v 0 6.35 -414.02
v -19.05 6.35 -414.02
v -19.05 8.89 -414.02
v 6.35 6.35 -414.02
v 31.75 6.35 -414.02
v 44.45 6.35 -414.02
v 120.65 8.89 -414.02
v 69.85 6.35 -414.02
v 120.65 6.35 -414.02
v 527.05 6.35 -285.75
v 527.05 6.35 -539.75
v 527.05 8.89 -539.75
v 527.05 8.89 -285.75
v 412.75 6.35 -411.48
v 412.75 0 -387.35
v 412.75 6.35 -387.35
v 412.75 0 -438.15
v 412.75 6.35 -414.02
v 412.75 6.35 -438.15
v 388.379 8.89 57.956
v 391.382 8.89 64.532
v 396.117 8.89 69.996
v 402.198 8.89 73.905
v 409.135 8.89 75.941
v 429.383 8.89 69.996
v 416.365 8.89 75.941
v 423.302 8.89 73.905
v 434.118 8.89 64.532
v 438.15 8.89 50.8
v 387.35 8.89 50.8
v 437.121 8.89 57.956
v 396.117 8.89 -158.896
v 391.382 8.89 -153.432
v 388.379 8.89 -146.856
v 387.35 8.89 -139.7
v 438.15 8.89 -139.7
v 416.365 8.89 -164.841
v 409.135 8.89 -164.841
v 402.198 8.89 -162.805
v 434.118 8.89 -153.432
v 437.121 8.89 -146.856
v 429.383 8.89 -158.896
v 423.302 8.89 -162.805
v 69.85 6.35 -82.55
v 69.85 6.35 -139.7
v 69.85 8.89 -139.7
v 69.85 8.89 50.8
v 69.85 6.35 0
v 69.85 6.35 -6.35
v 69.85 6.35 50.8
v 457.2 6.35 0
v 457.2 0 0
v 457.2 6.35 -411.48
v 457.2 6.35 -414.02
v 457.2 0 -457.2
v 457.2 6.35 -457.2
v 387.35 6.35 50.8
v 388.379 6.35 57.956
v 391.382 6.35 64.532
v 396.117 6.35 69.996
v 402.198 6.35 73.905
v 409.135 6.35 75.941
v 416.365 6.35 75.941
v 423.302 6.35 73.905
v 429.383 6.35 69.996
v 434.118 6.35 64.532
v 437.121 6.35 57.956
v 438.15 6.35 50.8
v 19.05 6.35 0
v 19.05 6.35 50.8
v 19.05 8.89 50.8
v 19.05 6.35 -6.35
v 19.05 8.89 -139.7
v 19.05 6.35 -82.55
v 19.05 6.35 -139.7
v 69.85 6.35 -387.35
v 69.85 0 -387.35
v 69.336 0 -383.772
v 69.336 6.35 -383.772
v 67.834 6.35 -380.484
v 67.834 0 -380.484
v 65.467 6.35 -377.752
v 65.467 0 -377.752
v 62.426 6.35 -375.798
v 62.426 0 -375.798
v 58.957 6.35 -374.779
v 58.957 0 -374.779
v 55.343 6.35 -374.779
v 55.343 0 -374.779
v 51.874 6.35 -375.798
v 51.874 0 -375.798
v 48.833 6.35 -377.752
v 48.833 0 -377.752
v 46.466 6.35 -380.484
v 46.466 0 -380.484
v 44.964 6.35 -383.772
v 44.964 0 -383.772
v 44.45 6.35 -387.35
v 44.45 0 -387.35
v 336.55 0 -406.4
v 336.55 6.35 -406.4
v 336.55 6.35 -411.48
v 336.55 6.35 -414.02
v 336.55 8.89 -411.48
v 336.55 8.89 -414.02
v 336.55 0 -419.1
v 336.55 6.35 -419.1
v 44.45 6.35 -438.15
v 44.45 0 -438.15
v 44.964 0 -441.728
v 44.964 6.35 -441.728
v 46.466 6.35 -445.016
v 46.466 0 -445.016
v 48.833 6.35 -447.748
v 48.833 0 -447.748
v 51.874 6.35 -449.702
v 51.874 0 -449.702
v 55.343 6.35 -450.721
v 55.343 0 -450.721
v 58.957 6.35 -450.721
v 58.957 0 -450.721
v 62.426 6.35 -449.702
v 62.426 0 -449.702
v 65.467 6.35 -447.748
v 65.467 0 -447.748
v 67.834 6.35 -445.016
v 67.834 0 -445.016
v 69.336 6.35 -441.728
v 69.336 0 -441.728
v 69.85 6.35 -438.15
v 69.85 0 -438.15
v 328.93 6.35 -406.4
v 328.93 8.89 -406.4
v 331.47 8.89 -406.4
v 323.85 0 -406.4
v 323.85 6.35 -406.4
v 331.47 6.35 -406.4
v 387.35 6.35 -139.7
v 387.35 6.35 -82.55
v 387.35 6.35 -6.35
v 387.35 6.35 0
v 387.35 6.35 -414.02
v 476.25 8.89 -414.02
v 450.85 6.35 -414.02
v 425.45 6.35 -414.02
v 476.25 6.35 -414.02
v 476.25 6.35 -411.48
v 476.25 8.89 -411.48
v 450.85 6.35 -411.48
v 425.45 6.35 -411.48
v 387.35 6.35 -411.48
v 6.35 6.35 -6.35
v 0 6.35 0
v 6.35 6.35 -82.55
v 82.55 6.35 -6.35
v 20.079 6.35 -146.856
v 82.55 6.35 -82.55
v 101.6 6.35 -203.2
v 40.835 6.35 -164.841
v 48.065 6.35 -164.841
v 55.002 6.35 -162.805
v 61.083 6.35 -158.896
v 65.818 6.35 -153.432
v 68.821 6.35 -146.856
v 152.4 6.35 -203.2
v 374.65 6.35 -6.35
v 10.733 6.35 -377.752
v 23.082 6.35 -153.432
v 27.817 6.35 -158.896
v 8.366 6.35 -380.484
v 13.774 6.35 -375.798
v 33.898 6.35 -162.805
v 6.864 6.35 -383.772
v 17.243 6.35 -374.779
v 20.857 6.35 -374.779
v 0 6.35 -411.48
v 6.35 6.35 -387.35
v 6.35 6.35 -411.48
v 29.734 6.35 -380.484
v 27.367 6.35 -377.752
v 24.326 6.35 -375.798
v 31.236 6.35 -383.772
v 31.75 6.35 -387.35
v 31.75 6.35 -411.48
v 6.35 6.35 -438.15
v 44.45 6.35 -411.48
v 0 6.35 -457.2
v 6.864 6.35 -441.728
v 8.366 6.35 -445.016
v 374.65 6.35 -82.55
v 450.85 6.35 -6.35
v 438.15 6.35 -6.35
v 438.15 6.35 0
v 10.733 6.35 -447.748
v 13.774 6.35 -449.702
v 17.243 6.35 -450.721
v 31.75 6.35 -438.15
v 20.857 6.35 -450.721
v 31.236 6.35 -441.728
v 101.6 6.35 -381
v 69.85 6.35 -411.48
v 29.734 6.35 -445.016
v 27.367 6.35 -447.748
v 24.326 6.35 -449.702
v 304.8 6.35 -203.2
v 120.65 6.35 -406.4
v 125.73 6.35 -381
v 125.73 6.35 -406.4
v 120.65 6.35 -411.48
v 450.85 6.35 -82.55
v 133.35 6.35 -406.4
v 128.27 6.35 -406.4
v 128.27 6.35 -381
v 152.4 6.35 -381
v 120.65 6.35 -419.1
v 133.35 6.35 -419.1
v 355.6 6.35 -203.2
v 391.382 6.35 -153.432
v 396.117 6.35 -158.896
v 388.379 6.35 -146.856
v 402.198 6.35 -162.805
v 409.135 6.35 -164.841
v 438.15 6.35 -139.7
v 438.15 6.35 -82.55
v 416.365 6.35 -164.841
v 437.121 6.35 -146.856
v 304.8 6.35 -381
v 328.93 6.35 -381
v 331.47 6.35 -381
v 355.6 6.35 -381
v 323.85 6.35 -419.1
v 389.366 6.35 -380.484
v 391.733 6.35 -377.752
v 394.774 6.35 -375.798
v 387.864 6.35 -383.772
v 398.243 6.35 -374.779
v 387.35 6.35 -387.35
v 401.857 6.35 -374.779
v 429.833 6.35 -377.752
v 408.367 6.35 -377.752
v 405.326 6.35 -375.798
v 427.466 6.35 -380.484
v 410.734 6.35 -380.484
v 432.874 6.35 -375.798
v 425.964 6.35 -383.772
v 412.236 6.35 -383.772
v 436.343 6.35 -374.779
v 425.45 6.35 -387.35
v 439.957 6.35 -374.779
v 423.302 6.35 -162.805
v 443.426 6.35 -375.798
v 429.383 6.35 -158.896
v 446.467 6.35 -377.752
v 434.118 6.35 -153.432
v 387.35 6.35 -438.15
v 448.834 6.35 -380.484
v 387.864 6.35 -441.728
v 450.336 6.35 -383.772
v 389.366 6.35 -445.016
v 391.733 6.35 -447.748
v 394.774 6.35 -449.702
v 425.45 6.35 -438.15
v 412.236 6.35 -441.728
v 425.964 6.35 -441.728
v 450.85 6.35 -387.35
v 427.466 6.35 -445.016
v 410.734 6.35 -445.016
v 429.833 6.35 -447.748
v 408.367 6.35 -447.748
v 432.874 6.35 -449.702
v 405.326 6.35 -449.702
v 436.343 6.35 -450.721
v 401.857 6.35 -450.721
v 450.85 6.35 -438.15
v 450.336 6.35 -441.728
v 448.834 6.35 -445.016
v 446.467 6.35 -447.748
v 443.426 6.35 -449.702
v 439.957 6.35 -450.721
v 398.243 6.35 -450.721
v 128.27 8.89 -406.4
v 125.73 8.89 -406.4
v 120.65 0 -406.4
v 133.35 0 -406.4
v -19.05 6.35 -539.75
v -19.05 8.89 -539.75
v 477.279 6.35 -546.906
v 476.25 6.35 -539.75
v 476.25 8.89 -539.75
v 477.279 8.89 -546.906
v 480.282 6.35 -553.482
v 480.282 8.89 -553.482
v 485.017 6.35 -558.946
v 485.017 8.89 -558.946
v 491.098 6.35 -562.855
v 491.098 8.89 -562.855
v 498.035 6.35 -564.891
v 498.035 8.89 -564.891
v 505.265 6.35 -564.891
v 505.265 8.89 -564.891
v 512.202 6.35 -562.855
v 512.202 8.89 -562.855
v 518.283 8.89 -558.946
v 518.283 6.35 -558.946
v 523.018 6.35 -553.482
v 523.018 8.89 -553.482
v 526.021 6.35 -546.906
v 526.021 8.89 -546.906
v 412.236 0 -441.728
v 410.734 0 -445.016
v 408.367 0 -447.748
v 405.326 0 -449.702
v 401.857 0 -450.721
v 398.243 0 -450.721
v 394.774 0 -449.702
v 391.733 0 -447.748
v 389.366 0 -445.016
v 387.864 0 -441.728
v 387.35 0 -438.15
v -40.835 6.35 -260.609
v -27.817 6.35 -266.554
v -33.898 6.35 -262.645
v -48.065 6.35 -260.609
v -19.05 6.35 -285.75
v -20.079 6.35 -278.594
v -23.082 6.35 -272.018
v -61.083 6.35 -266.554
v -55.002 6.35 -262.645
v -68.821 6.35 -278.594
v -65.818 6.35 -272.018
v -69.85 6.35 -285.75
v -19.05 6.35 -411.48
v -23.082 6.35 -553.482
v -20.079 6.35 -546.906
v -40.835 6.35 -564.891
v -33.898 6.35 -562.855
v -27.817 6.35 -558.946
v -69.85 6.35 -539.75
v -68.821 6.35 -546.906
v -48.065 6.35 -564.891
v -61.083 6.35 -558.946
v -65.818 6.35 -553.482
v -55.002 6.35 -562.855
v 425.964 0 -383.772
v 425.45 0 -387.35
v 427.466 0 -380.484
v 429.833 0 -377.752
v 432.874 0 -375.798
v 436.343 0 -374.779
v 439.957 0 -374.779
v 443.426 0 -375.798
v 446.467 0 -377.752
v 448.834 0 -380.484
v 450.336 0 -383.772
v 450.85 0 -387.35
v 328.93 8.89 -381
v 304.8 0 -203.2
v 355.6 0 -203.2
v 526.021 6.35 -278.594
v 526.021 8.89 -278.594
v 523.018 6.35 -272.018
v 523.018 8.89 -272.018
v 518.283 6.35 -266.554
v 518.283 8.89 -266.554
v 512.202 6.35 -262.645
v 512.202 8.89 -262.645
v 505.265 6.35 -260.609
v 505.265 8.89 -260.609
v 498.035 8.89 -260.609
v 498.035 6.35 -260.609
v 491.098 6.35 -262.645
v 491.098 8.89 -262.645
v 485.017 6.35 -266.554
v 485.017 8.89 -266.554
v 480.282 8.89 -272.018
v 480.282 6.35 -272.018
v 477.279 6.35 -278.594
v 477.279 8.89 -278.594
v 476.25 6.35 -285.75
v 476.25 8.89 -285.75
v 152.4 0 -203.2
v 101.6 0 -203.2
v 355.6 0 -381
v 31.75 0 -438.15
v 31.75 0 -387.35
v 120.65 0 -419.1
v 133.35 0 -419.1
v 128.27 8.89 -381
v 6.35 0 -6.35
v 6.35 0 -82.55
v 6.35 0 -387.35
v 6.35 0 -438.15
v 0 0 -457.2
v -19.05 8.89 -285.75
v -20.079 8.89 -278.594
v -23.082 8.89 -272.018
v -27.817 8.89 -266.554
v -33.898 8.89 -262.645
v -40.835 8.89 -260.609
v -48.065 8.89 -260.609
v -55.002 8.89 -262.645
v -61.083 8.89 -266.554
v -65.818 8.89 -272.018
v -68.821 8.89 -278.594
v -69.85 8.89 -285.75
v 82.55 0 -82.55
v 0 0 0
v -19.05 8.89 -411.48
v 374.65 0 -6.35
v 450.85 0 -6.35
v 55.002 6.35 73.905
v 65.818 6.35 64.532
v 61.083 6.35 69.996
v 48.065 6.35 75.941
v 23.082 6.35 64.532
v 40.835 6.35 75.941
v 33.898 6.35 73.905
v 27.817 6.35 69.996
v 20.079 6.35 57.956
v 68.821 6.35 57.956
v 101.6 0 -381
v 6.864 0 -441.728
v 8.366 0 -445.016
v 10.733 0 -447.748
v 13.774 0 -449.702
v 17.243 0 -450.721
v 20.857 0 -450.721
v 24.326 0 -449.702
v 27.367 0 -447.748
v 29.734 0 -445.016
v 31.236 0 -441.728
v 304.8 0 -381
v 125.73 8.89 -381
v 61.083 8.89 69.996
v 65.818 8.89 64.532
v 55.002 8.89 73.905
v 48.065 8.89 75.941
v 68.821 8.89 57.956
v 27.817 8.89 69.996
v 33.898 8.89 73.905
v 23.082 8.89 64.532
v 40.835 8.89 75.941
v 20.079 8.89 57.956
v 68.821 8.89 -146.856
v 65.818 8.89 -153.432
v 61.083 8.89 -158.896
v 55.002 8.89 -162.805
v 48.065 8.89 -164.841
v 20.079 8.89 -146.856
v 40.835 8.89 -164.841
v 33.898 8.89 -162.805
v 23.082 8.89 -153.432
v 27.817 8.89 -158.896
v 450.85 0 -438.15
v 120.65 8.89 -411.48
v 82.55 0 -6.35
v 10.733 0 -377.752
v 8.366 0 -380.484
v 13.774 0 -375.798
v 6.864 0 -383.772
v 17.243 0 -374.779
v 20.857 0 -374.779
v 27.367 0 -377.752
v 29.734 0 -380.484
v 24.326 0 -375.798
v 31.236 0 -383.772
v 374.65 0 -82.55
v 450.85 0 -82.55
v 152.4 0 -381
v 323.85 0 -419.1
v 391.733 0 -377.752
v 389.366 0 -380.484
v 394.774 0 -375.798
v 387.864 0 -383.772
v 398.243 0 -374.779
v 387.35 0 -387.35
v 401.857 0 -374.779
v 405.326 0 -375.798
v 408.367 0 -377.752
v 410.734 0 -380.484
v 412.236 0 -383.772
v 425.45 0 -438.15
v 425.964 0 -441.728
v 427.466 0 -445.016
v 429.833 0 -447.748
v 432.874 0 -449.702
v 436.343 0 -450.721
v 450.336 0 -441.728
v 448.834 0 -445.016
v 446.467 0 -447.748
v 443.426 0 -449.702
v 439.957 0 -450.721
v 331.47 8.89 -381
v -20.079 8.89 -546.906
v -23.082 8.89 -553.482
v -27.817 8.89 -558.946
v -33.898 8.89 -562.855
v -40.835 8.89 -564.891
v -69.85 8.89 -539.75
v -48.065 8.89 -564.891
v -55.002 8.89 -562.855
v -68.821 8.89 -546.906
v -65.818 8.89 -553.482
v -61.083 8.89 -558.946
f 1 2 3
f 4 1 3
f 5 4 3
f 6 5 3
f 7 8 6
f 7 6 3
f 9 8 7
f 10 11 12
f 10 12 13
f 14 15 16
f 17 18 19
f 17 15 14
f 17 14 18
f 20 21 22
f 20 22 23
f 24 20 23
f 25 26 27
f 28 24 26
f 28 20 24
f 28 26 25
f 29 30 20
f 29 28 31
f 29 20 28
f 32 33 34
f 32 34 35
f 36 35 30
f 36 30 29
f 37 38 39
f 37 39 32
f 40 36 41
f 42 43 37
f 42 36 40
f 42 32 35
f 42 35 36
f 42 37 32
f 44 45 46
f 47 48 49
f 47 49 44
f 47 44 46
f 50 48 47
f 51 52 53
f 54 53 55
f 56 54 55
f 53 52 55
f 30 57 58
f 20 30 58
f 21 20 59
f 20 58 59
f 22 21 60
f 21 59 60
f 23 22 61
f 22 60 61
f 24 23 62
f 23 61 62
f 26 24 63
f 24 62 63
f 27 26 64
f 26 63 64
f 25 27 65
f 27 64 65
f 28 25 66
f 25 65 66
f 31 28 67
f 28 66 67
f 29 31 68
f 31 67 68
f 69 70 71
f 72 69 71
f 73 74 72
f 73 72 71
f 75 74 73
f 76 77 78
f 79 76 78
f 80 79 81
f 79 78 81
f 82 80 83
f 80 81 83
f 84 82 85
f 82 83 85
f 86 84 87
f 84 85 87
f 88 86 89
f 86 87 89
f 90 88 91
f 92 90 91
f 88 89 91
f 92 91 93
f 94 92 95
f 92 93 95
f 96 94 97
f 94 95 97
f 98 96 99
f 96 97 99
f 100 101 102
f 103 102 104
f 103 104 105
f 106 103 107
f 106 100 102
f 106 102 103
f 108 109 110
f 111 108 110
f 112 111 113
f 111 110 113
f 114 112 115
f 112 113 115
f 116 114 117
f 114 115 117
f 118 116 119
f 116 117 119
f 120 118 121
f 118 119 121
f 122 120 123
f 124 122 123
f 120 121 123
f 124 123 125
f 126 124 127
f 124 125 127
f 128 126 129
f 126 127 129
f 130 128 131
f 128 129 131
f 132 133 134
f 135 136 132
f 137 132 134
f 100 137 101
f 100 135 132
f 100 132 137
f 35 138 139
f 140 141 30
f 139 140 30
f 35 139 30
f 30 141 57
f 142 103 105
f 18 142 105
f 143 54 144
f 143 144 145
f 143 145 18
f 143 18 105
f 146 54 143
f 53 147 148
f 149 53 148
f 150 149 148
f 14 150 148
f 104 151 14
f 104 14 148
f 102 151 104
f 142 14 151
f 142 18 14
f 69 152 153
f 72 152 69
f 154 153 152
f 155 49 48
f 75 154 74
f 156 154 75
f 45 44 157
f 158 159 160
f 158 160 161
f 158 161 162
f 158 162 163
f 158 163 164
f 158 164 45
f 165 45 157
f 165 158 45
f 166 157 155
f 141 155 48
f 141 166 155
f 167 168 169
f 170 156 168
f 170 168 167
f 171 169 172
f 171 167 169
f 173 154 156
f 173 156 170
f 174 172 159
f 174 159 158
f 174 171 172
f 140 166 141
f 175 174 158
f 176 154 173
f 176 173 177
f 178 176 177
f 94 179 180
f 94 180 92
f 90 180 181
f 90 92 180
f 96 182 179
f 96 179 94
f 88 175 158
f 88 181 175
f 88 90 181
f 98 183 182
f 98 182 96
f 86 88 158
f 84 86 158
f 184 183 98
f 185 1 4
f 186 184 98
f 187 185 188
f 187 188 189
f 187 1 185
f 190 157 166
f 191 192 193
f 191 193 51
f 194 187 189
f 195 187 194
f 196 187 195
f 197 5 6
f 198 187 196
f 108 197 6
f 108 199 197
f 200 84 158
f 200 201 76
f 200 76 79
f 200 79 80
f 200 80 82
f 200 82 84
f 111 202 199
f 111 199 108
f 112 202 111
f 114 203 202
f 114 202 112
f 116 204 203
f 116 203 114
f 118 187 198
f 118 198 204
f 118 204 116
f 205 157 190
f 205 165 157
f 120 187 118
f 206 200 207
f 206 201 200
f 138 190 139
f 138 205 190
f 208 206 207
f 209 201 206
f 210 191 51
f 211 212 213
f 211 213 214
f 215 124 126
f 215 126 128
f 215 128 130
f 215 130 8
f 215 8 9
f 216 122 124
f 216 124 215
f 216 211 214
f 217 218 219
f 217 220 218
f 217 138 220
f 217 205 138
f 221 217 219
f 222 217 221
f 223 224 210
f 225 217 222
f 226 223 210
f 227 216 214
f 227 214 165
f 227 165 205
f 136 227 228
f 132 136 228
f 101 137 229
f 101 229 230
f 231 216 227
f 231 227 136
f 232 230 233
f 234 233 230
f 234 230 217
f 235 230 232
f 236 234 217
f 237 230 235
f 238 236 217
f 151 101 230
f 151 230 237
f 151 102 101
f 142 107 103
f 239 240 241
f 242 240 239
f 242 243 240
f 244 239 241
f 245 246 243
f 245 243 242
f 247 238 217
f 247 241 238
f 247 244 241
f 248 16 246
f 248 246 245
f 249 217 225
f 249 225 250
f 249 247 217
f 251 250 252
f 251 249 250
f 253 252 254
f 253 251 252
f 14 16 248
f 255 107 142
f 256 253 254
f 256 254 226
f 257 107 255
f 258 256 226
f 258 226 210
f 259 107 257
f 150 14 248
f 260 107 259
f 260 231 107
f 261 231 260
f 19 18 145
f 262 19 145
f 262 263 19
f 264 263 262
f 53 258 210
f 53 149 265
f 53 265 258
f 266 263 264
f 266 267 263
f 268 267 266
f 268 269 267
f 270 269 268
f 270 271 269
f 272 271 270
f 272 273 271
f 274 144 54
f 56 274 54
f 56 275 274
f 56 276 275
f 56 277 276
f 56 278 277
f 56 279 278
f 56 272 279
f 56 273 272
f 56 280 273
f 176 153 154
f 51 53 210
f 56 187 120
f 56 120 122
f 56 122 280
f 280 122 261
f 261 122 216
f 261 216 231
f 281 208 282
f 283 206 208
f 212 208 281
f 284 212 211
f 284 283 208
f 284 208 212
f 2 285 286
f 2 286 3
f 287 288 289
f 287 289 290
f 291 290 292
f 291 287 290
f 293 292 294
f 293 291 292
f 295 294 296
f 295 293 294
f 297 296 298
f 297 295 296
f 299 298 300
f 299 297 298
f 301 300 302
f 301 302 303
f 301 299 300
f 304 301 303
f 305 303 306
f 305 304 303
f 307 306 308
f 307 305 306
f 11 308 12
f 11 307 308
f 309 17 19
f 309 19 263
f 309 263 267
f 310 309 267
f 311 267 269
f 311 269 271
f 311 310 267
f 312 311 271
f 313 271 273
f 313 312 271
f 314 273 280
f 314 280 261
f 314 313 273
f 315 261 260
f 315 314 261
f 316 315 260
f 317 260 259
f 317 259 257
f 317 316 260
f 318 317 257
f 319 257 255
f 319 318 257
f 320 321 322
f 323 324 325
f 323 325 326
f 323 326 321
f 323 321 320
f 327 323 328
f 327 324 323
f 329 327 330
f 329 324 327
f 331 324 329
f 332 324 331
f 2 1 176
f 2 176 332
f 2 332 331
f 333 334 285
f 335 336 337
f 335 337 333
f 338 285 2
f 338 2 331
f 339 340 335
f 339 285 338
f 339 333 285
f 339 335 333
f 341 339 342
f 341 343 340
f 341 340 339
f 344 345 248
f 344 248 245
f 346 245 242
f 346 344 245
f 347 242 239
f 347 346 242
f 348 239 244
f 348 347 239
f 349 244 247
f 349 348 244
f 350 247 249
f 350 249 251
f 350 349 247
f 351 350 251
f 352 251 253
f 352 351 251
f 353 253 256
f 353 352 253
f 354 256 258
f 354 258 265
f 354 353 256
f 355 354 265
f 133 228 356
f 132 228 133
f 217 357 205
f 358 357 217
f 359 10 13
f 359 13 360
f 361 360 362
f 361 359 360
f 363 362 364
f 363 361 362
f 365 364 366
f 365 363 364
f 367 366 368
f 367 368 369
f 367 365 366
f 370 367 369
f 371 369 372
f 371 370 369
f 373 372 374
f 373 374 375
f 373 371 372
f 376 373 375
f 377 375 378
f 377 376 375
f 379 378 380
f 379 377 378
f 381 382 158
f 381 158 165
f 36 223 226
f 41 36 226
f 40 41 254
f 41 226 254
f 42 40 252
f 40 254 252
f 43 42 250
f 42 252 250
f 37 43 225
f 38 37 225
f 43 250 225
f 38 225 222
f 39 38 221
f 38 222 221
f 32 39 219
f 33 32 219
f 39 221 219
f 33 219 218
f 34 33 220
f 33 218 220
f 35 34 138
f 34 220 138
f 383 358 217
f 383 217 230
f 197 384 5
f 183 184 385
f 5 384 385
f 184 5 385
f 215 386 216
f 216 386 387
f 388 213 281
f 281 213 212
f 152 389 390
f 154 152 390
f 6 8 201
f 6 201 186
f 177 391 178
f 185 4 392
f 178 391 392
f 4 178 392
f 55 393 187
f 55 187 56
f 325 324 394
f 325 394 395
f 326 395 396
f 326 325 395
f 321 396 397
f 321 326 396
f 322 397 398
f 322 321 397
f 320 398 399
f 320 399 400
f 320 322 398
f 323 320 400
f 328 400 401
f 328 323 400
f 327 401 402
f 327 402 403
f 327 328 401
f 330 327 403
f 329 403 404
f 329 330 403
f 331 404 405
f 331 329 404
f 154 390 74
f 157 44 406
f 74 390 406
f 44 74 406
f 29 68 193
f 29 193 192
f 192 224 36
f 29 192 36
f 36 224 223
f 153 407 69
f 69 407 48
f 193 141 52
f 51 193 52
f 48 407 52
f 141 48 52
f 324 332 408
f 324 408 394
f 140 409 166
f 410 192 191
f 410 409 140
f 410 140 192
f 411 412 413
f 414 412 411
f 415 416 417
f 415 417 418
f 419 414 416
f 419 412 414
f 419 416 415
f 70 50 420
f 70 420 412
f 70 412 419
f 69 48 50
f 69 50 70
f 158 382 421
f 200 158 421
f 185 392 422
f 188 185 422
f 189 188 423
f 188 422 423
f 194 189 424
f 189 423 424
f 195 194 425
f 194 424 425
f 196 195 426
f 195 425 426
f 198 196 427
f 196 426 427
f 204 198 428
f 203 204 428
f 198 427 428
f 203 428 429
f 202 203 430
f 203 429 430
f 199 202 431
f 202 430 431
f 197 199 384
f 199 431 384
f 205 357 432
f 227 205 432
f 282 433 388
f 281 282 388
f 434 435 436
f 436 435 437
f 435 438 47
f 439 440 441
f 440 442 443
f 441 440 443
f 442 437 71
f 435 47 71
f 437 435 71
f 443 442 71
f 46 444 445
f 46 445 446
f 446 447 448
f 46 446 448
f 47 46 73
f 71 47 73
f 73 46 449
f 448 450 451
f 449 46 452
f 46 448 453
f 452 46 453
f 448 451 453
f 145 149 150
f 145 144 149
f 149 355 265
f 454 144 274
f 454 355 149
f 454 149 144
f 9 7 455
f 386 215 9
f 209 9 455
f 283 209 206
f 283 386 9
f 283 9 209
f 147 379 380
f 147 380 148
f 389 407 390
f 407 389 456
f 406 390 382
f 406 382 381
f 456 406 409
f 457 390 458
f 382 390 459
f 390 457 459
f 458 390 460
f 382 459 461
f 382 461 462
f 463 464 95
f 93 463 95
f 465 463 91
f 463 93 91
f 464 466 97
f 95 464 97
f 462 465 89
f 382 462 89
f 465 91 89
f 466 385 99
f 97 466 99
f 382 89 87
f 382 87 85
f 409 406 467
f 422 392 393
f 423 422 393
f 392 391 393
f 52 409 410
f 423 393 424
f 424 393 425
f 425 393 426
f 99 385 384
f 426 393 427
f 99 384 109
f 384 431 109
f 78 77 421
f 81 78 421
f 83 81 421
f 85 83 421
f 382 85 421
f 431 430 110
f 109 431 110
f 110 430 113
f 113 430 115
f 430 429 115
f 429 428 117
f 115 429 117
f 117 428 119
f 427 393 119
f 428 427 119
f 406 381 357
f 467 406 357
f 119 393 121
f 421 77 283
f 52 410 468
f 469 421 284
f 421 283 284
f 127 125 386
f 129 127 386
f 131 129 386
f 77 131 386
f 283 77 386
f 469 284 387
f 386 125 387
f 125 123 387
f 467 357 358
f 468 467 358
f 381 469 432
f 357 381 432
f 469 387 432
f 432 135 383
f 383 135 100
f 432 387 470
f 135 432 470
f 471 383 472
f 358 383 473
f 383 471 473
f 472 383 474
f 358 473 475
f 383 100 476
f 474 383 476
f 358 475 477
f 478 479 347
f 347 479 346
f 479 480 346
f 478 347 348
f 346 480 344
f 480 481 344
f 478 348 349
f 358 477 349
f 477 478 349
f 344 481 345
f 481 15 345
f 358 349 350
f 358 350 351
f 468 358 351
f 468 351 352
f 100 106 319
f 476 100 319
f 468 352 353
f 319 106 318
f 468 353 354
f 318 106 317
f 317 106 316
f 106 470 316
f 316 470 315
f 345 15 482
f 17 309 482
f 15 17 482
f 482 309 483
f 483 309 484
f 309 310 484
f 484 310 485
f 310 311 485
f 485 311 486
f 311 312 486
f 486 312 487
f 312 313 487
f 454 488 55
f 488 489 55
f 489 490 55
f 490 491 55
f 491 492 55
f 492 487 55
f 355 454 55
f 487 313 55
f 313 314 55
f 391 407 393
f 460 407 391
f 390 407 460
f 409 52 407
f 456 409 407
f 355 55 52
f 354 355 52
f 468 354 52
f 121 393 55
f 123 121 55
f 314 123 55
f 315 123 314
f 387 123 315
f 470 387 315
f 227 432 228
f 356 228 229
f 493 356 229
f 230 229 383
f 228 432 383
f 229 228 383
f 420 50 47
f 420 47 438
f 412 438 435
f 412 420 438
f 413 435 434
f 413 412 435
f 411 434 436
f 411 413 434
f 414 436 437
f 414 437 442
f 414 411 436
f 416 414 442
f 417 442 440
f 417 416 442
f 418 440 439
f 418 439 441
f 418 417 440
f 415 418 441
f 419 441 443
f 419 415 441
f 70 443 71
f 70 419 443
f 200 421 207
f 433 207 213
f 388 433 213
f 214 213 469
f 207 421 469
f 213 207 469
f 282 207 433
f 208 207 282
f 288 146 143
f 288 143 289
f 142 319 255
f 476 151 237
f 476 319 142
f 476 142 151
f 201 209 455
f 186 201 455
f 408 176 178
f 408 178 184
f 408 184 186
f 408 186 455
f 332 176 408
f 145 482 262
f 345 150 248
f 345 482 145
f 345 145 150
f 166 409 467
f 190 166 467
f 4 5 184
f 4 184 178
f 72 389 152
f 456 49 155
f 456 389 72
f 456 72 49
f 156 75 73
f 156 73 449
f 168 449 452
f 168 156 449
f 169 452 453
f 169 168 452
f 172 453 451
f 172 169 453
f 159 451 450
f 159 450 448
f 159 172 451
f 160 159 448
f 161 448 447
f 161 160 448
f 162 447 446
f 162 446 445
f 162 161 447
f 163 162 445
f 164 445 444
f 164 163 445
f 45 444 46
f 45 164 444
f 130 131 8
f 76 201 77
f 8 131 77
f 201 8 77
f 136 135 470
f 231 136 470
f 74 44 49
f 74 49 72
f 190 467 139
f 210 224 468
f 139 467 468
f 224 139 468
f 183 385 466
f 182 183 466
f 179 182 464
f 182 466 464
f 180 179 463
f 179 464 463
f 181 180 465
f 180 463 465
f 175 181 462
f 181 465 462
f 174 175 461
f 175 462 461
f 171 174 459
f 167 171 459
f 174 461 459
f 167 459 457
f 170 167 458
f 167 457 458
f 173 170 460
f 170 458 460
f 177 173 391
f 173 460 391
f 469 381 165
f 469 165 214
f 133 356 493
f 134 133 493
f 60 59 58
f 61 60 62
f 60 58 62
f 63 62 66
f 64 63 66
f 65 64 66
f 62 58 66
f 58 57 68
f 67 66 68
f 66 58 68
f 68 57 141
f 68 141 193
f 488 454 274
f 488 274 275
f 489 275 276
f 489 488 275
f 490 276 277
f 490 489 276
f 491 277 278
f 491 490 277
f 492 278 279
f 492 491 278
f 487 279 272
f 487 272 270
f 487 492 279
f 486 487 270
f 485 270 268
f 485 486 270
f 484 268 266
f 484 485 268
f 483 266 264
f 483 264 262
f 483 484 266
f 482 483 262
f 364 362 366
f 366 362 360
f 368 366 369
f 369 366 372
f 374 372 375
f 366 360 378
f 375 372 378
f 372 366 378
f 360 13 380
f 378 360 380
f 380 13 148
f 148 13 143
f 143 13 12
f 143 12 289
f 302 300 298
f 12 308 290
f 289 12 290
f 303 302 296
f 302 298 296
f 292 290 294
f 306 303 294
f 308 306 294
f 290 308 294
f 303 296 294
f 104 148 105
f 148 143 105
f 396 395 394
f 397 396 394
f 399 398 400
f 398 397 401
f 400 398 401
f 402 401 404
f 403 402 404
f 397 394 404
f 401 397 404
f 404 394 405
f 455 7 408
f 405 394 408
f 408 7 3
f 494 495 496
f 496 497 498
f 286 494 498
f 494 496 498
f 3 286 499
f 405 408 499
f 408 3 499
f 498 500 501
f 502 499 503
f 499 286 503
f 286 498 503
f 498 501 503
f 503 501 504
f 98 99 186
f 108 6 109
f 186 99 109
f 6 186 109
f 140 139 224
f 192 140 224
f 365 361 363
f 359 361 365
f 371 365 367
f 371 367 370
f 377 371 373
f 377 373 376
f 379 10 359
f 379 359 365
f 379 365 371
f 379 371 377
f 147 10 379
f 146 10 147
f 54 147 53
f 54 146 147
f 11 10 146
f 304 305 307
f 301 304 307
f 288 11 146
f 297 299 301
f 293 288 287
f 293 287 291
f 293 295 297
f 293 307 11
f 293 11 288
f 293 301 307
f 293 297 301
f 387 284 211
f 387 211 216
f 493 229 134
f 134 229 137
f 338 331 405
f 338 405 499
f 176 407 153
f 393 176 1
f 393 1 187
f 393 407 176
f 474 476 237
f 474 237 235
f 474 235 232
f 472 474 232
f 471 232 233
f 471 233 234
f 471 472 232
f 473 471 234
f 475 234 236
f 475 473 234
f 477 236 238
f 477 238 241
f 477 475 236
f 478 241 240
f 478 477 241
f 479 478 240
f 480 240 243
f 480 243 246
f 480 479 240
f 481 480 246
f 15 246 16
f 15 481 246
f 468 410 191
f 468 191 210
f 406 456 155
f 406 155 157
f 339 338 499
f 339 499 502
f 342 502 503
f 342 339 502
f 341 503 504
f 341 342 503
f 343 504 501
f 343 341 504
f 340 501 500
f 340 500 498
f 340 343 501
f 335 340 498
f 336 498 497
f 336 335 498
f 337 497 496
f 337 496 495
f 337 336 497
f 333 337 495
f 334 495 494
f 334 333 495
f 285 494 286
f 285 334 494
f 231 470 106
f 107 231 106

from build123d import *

# Parameters (mm, degrees)
SKETCH2_W           = 457.2
SKETCH2_H           = 457.2
SKETCH2_W_2         = 12.7
SKETCH2_H_2         = 12.7
SKETCH2_W_3         = 50.8
SKETCH2_H_3         = 177.8
SKETCH2_W_4         = 76.2
SKETCH2_H_4         = 76.2
BOSS_EXTRUDE1_DEPTH = 6.35
SKETCH3_W           = 2.54
SKETCH3_H           = 25.4
BOSS_EXTRUDE2_DEPTH = 2.54


with BuildPart() as part:
    # Sketch2 → Boss-Extrude1 (new body)
    with BuildSketch(Plane(origin=(0, 0, 0), x_dir=(1, 0, 0), z_dir=(0, 1, 0))):
        with Locations((228.6, 228.6)):
            Rectangle(SKETCH2_W, SKETCH2_H)
        with BuildLine():
            Line((31.75, 438.15), (31.75, 387.35))
            ThreePointArc((31.75, 387.35), (19.05, 374.65), (6.35, 387.35))
            Line((6.35, 387.35), (6.35, 438.15))
            ThreePointArc((6.35, 438.15), (19.05, 450.85), (31.75, 438.15))
        make_face(mode=Mode.SUBTRACT)
        with BuildLine():
            Line((69.85, 438.15), (69.85, 387.35))
            ThreePointArc((69.85, 387.35), (57.15, 374.65), (44.45, 387.35))
            Line((44.45, 387.35), (44.45, 438.15))
            ThreePointArc((44.45, 438.15), (57.15, 450.85), (69.85, 438.15))
        make_face(mode=Mode.SUBTRACT)
        with BuildLine():
            Line((425.45, 438.15), (425.45, 387.35))
            ThreePointArc((425.45, 387.35), (438.15, 374.65), (450.85, 387.35))
            Line((450.85, 387.35), (450.85, 438.15))
            ThreePointArc((450.85, 438.15), (438.15, 450.85), (425.45, 438.15))
        make_face(mode=Mode.SUBTRACT)
        with BuildLine():
            Line((387.35, 438.15), (387.35, 387.35))
            ThreePointArc((387.35, 387.35), (400.05, 374.65), (412.75, 387.35))
            Line((412.75, 387.35), (412.75, 438.15))
            ThreePointArc((412.75, 438.15), (400.05, 450.85), (387.35, 438.15))
        make_face(mode=Mode.SUBTRACT)
        with Locations((330.2, 412.75)):
            Rectangle(SKETCH2_W_2, SKETCH2_H_2, mode=Mode.SUBTRACT)
        with Locations((127, 292.1)):
            Rectangle(SKETCH2_W_3, SKETCH2_H_3, mode=Mode.SUBTRACT)
        with Locations((127, 412.75)):
            Rectangle(SKETCH2_W_2, SKETCH2_H_2, mode=Mode.SUBTRACT)
        with Locations((330.2, 292.1)):
            Rectangle(SKETCH2_W_3, SKETCH2_H_3, mode=Mode.SUBTRACT)
        with Locations((412.75, 44.45)):
            Rectangle(SKETCH2_W_4, SKETCH2_H_4, mode=Mode.SUBTRACT)
        with Locations((44.45, 44.45)):
            Rectangle(SKETCH2_W_4, SKETCH2_H_4, mode=Mode.SUBTRACT)
    extrude(amount=BOSS_EXTRUDE1_DEPTH)

    # Sketch3 → Boss-Extrude2 (add)
    with BuildSketch(Plane(origin=(0, 6.35, 0), x_dir=(1, 0, 0), z_dir=(0, 1, 0))):
        with BuildLine():
            Line((120.65, 411.48), (-19.05, 411.48))
            Line((-19.05, 411.48), (-19.05, 285.75))
            ThreePointArc((-19.05, 285.75), (-44.45, 260.35), (-69.85, 285.75))
            Line((-69.85, 285.75), (-69.85, 539.75))
            ThreePointArc((-69.85, 539.75), (-44.45, 565.15), (-19.05, 539.75))
            Line((-19.05, 539.75), (-19.05, 414.02))
            Line((-19.05, 414.02), (120.65, 414.02))
            Line((120.65, 414.02), (120.65, 411.48))
        make_face()
        with Locations((127, 393.7)):
            Rectangle(SKETCH3_W, SKETCH3_H)
        with Locations((330.2, 393.7)):
            Rectangle(SKETCH3_W, SKETCH3_H)
        with BuildLine():
            Line((336.55, 411.48), (336.55, 414.02))
            Line((336.55, 414.02), (476.25, 414.02))
            Line((476.25, 414.02), (476.25, 539.75))
            ThreePointArc((476.25, 539.75), (501.65, 565.15), (527.05, 539.75))
            Line((527.05, 539.75), (527.05, 285.75))
            ThreePointArc((527.05, 285.75), (501.65, 260.35), (476.25, 285.75))
            Line((476.25, 285.75), (476.25, 411.48))
            Line((476.25, 411.48), (336.55, 411.48))
        make_face()
        with BuildLine():
            Line((69.85, 139.7), (69.85, -50.8))
            ThreePointArc((69.85, -50.8), (44.45, -76.2), (19.05, -50.8))
            Line((19.05, -50.8), (19.05, 139.7))
            ThreePointArc((19.05, 139.7), (44.45, 165.1), (69.85, 139.7))
        make_face()
        with BuildLine():
            Line((387.35, 139.7), (387.35, -50.8))
            ThreePointArc((387.35, -50.8), (412.75, -76.2), (438.15, -50.8))
            Line((438.15, -50.8), (438.15, 139.7))
            ThreePointArc((438.15, 139.7), (412.75, 165.1), (387.35, 139.7))
        make_face()
    extrude(amount=BOSS_EXTRUDE2_DEPTH)


solid = part.part
